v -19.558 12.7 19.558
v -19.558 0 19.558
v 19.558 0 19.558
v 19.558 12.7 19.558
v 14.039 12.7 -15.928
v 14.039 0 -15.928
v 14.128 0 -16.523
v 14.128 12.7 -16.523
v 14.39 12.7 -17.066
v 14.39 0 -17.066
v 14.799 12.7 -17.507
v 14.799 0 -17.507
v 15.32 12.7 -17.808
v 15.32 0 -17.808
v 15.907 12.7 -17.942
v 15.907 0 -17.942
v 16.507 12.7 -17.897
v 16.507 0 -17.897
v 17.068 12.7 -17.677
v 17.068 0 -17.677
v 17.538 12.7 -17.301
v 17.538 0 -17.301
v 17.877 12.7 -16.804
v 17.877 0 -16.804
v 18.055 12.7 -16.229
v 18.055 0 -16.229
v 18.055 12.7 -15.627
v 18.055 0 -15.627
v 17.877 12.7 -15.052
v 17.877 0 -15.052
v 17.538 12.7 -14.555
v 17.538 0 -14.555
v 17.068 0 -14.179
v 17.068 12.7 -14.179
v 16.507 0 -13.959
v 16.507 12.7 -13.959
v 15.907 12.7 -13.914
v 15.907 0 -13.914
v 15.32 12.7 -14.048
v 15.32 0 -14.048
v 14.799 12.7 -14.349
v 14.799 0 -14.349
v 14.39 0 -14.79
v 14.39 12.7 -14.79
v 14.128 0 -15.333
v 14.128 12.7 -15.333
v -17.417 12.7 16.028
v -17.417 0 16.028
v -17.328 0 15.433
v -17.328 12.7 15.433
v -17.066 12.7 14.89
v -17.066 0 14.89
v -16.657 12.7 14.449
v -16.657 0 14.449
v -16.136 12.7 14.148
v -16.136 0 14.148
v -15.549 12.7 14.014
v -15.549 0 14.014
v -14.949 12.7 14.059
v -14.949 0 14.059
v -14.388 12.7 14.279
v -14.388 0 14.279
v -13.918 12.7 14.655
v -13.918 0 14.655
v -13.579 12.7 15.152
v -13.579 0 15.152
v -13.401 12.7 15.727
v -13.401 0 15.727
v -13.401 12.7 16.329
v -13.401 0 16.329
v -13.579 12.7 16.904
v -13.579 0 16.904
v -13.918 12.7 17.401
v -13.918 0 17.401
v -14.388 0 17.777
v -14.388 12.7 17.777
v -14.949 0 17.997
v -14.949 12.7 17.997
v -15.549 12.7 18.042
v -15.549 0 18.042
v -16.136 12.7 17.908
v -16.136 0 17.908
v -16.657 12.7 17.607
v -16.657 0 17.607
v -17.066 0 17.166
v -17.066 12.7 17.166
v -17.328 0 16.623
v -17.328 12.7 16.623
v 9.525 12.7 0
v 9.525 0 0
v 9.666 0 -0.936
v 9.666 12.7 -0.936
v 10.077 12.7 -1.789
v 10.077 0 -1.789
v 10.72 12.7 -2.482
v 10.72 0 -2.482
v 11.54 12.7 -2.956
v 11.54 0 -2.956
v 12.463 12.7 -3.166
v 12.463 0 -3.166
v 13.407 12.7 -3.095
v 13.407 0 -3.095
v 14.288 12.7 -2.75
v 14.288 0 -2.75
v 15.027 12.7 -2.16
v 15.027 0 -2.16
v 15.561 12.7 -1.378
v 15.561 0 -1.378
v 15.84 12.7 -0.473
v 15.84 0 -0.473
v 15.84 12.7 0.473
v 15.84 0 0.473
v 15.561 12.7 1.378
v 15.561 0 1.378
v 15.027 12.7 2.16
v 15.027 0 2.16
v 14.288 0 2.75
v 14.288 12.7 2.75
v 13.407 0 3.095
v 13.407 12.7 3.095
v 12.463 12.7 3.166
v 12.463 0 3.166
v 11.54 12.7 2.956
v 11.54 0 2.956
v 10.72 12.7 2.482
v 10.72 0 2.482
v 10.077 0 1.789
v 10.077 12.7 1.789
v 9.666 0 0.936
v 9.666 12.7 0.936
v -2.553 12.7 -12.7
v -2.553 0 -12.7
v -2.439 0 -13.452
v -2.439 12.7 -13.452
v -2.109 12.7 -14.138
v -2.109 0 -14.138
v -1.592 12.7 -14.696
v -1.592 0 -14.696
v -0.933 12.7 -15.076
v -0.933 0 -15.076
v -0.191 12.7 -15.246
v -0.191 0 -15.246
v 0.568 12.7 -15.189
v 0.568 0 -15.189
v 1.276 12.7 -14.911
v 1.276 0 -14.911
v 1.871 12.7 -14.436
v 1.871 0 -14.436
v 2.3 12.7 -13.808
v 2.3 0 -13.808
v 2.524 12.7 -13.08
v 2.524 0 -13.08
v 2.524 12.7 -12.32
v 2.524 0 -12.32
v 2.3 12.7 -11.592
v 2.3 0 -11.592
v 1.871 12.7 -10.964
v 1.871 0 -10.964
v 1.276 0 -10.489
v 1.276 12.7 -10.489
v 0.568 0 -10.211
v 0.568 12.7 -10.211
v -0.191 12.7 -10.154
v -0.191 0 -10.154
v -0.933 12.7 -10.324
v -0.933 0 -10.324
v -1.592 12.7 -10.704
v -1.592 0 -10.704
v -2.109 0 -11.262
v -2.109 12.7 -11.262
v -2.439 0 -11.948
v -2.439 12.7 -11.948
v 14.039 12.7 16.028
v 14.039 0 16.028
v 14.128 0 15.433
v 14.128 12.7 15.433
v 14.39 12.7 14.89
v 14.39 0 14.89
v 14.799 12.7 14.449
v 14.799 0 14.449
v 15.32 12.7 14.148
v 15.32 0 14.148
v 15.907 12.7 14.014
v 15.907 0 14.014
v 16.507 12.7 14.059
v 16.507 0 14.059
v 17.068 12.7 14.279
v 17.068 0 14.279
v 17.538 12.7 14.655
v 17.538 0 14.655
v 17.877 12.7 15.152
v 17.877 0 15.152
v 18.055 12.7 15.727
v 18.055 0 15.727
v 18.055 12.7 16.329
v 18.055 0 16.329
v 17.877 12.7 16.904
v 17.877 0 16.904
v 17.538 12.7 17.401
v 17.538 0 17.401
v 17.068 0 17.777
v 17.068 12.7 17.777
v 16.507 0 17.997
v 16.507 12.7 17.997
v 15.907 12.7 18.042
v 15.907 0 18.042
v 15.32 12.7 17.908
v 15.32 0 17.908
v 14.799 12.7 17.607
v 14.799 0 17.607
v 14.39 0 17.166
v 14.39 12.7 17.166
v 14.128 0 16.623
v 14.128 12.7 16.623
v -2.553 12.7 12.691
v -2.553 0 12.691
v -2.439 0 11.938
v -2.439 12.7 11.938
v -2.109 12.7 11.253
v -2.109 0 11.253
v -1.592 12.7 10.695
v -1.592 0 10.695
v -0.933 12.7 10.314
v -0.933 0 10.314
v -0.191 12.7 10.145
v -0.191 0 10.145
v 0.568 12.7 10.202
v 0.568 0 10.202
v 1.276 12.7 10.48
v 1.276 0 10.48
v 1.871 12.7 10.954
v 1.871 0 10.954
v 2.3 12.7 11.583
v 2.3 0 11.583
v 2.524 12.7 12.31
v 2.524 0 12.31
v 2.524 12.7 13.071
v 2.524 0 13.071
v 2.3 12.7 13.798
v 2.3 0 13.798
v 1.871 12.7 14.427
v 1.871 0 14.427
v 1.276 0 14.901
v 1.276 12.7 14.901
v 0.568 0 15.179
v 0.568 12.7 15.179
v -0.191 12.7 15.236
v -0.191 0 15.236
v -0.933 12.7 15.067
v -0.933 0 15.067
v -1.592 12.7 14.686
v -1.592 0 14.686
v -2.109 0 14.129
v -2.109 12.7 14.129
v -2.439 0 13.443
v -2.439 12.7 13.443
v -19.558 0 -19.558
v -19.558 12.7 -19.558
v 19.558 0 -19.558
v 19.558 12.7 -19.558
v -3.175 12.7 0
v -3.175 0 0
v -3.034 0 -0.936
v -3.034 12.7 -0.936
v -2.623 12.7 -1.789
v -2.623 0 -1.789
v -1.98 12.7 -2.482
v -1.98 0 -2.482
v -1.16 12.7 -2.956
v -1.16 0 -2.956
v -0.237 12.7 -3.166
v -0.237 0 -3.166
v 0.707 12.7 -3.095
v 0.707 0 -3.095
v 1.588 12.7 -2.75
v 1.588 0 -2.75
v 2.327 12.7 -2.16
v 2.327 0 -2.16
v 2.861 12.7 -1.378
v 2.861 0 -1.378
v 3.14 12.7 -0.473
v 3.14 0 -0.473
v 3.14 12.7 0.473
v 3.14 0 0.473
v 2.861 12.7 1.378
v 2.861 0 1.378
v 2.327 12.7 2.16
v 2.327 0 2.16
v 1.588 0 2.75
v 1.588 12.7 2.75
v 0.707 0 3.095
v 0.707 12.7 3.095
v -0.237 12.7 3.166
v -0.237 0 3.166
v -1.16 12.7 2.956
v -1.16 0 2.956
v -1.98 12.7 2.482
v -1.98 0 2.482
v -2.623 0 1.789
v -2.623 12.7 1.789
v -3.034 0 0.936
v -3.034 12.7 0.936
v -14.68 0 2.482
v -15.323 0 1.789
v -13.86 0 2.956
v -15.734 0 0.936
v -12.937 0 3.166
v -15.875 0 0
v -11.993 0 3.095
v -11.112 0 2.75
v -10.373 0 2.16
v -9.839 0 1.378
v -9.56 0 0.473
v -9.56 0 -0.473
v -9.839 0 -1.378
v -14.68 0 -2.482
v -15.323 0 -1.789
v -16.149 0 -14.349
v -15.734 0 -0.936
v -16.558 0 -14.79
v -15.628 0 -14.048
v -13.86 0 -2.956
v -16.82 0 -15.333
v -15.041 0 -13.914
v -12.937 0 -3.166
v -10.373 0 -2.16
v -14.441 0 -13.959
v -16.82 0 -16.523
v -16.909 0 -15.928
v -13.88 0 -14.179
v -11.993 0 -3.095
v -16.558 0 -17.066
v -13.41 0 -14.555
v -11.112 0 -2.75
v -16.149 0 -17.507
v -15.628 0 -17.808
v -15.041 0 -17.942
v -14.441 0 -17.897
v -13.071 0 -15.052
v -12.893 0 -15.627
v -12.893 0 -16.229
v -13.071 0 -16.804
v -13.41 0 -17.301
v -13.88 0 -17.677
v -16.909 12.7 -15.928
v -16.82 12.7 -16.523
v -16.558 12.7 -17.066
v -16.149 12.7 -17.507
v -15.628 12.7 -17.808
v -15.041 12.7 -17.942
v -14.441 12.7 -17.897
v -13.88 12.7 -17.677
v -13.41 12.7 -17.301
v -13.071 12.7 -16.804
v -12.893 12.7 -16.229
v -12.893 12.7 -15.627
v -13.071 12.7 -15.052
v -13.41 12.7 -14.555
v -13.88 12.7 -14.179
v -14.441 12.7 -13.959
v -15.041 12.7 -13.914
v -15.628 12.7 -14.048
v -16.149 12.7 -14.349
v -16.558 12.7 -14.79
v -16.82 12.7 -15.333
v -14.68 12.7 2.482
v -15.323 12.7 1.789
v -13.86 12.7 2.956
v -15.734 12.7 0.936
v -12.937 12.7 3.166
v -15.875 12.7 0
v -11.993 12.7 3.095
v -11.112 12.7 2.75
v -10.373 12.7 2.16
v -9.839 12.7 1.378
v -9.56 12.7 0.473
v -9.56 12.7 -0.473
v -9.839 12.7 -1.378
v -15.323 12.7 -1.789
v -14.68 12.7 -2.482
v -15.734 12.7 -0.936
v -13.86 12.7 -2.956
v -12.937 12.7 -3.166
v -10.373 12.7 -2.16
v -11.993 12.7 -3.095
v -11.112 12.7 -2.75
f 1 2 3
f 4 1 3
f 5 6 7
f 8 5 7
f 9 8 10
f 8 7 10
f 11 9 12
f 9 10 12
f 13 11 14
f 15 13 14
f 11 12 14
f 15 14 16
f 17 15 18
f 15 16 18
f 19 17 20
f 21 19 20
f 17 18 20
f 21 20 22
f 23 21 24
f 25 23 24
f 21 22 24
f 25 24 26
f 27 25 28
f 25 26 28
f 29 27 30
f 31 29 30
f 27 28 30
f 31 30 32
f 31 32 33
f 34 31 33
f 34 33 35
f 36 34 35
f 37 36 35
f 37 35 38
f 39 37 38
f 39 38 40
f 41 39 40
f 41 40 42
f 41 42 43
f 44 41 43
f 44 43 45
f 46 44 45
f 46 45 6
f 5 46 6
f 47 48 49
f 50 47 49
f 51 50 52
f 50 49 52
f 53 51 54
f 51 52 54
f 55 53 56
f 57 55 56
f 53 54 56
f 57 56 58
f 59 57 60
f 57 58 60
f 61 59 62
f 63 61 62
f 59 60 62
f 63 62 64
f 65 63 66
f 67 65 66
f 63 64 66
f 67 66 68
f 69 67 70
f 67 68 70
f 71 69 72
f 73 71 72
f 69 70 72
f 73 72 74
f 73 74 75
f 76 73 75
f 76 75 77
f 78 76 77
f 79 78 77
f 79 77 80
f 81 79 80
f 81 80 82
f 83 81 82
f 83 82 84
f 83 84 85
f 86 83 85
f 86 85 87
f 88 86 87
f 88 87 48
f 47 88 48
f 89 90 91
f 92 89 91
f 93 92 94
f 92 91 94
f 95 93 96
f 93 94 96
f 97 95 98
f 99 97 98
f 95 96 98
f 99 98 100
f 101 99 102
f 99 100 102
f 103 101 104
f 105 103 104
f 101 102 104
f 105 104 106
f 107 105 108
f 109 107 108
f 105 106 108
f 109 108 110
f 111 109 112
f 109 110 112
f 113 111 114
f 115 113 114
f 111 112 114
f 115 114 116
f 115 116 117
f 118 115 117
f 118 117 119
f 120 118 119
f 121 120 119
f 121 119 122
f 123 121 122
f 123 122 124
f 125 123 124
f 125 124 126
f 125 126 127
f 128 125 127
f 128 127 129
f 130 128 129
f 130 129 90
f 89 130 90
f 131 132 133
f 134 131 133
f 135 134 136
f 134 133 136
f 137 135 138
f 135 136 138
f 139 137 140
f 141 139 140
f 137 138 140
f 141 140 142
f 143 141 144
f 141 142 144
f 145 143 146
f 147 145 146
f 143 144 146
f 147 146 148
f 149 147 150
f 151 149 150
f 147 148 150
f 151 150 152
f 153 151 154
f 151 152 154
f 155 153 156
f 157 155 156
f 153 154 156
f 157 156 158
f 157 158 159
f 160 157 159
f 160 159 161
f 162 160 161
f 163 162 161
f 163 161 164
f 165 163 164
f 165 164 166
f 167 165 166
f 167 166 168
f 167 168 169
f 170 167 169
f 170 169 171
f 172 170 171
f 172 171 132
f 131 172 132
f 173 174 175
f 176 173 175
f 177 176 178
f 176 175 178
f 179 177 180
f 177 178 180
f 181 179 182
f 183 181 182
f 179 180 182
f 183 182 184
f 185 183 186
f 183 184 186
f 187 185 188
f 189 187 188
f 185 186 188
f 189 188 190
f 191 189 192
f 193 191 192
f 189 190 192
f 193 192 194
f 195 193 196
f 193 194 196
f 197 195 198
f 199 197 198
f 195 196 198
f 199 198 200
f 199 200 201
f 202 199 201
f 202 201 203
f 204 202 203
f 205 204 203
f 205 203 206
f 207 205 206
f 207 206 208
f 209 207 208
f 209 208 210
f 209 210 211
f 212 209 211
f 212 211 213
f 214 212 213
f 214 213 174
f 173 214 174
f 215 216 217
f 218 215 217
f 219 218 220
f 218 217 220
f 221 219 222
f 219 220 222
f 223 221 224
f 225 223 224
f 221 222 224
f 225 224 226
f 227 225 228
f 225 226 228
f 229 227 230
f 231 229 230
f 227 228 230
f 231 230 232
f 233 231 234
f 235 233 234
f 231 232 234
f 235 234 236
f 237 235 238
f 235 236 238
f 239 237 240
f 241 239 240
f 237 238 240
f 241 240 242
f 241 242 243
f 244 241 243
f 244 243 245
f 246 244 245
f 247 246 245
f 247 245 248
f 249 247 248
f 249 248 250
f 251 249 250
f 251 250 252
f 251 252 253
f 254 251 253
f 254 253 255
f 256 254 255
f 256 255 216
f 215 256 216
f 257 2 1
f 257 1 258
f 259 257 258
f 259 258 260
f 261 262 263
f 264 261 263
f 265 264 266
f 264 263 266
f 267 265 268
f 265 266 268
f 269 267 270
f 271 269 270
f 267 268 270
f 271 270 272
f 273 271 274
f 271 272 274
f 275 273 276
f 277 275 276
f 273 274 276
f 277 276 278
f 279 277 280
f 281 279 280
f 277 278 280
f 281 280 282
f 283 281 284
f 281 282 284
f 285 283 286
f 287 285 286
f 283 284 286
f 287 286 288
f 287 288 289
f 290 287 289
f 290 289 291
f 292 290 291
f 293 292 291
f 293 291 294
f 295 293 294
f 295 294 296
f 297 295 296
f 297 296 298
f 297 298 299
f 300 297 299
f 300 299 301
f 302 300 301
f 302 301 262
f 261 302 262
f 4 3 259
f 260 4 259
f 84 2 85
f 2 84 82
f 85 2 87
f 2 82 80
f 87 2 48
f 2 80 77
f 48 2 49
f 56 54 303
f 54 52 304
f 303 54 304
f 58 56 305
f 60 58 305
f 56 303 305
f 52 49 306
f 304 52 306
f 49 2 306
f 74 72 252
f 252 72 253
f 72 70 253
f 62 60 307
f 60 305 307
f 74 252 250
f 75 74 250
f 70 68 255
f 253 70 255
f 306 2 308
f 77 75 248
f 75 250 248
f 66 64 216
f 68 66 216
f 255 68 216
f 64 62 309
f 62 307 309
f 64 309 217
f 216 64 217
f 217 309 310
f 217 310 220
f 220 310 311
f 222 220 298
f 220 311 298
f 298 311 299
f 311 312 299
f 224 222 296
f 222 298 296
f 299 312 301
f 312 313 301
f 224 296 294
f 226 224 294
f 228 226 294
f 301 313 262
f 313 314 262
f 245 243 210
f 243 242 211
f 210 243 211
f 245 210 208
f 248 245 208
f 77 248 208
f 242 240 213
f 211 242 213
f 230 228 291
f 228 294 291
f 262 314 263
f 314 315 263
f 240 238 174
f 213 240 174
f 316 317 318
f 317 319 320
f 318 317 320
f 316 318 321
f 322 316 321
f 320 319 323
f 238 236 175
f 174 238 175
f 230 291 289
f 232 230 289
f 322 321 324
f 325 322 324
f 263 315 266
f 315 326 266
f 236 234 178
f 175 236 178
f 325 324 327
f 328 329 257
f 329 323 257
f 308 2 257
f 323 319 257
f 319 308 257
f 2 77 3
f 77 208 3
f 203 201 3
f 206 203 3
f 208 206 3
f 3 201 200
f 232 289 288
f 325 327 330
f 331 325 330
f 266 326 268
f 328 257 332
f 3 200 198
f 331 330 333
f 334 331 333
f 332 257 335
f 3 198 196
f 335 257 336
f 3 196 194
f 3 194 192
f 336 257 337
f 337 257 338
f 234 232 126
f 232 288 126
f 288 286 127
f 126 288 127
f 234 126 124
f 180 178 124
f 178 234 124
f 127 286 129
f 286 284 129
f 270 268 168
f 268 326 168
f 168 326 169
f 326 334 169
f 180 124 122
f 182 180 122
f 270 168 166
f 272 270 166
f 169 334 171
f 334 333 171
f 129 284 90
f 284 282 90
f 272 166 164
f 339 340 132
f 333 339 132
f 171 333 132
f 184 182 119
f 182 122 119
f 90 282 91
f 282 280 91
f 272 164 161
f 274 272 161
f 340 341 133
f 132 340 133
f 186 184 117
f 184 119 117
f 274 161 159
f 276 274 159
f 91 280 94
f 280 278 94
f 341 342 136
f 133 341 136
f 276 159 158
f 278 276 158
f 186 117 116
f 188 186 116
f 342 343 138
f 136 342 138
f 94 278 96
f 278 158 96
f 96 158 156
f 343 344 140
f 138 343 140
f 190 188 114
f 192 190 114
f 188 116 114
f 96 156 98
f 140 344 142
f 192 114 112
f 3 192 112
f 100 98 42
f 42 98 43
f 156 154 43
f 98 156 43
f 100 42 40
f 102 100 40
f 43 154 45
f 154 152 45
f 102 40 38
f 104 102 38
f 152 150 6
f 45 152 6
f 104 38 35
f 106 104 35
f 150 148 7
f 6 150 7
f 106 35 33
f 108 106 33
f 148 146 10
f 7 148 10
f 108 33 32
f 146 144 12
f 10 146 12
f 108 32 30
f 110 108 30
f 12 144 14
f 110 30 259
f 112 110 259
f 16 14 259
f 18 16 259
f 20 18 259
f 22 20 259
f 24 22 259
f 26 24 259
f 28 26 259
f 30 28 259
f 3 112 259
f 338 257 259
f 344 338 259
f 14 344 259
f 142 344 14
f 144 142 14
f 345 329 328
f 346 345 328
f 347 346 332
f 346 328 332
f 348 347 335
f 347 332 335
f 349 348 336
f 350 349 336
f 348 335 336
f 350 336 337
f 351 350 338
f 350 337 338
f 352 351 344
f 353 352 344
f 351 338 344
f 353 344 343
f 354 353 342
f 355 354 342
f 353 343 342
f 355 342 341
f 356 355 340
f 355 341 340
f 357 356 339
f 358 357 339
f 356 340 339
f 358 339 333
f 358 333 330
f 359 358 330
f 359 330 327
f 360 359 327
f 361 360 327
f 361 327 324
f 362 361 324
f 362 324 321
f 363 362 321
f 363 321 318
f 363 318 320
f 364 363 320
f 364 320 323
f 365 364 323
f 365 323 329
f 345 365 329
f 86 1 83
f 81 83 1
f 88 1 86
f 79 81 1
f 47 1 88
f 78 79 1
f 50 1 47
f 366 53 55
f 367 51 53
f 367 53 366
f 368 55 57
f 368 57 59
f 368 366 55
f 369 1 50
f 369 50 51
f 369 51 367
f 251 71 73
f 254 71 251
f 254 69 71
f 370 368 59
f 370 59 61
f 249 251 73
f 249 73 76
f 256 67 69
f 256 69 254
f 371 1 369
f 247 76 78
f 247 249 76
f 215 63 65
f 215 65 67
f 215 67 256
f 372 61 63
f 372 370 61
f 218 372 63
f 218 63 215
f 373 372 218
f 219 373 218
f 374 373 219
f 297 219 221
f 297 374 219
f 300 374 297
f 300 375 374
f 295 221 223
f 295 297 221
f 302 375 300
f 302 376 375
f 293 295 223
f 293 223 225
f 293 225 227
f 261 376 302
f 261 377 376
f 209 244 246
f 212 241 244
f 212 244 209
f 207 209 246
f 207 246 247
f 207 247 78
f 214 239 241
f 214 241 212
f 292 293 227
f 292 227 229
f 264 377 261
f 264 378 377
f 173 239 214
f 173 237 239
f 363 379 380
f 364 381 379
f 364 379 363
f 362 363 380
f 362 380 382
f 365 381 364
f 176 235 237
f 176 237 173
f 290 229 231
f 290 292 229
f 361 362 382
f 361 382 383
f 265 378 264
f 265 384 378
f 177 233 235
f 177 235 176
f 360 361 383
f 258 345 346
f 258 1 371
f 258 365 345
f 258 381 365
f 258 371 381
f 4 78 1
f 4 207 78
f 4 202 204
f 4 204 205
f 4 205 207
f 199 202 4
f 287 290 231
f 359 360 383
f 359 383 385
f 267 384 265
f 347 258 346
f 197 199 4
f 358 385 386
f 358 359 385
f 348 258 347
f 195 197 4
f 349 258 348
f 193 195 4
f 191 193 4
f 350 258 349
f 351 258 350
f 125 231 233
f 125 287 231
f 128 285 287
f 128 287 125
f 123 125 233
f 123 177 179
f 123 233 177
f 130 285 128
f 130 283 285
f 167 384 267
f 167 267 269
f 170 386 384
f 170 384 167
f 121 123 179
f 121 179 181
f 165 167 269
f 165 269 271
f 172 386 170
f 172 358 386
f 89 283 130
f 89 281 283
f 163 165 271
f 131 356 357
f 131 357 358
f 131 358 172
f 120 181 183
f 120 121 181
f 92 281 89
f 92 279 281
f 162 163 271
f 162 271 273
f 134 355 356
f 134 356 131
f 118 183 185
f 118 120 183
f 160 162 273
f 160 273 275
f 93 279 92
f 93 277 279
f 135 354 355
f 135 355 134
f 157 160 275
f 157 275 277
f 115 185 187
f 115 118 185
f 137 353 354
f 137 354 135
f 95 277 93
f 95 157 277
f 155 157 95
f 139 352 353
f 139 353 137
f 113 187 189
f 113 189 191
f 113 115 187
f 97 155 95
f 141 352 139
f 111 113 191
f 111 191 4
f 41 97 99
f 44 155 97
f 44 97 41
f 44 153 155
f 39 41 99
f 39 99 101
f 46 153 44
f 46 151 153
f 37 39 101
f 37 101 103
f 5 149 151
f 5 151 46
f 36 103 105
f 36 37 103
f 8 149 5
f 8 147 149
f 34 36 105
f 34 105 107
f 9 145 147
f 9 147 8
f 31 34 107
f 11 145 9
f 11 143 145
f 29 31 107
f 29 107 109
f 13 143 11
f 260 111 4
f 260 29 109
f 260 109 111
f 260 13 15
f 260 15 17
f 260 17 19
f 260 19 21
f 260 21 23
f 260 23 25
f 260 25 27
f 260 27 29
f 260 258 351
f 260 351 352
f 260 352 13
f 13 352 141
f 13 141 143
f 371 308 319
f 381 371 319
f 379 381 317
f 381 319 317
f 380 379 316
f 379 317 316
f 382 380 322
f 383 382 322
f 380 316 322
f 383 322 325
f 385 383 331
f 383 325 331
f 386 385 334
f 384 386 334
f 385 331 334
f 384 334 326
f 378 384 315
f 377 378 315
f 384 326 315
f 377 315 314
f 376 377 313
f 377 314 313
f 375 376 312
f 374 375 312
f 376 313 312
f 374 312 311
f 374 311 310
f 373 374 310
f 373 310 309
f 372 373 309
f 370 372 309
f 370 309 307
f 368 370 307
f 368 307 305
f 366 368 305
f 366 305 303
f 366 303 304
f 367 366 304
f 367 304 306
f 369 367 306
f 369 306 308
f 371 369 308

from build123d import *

# Parameters (mm, degrees)
SKETCH1_W                       = 39.116
SKETCH1_H                       = 39.116
BOSS_EXTRUDE1_DEPTH             = 12.7
F_21_0_159_DIAMETER_HOLE1_D     = 4.0386
F_21_0_159_DIAMETER_HOLE1_DEPTH = 12.7
F_1_4_0_25_DIAMETER_HOLE1_D     = 6.35
F_1_4_0_25_DIAMETER_HOLE1_DEPTH = 12.7
LPATTERN1_COUNT                 = 2
LPATTERN1_PITCH                 = 12.7
LPATTERN1_COL_COUNT             = 2
LPATTERN1_COL_PITCH             = 12.7
F_1_4_20_TAPPED_HOLE1_D         = 5.1054
F_1_4_20_TAPPED_HOLE1_DEPTH     = 12.7


with BuildPart() as part:
    # Sketch1 → Boss-Extrude1 (new body)
    with BuildSketch(Plane(origin=(0, 0, 0), x_dir=(1, 0, 0), z_dir=(0, 1, 0))):
        Rectangle(SKETCH1_W, SKETCH1_H)
    extrude(amount=BOSS_EXTRUDE1_DEPTH)

    # #21 (0.159) Diameter Hole1
    with Locations(Plane(origin=(0, 12.7, 0), x_dir=(1, 0, 0), z_dir=(0, 1, 0))):
        with Locations((-14.89, 15.928), (-15.398, -16.028), (16.058, -16.028), (16.058, 15.928)):
            Hole(F_21_0_159_DIAMETER_HOLE1_D / 2, depth=F_21_0_159_DIAMETER_HOLE1_DEPTH)

    # 1/4 (0.25) Diameter Hole1
    with Locations(Plane(origin=(0, 12.7, 0), x_dir=(1, 0, 0), z_dir=(0, 1, 0))):
        with Locations((0, 0)):
            f_1_4_0_25_diameter_hole1 = Hole(F_1_4_0_25_DIAMETER_HOLE1_D / 2, depth=F_1_4_0_25_DIAMETER_HOLE1_DEPTH)

    # LPattern1: 1/4 (0.25) Diameter Hole1 ×2
    with Locations(*[(-i * LPATTERN1_PITCH, 0, 0) for i in range(1, LPATTERN1_COUNT)]):
        add(f_1_4_0_25_diameter_hole1, mode=Mode.SUBTRACT)

    # LPattern1 col: 1/4 (0.25) Diameter Hole1 ×2
    with Locations(*[(i * LPATTERN1_COL_PITCH, 0, 0) for i in range(1, LPATTERN1_COL_COUNT)]):
        add(f_1_4_0_25_diameter_hole1, mode=Mode.SUBTRACT)

    # 1/4-20 Tapped Hole1
    with Locations(Plane(origin=(0, 12.7, 0), x_dir=(1, 0, 0), z_dir=(0, 1, 0))):
        with Locations((0, 12.7), (0, -12.690681966)):
            Hole(F_1_4_20_TAPPED_HOLE1_D / 2, depth=F_1_4_20_TAPPED_HOLE1_DEPTH)


solid = part.part
